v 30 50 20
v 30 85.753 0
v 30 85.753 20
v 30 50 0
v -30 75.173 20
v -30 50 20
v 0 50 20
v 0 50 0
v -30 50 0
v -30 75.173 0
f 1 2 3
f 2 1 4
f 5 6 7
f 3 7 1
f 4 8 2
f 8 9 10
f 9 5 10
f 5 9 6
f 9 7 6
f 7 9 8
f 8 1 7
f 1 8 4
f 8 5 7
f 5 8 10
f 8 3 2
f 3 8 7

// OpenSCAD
translate([-30,50,0])
scale([3,3,1])
rotate([0,0,0]) {
    difference() {
        cube([20, 20, 20]);
        translate([10, 0, -1]) {
            rotate([0,0,50]) {
                cube([30, 30, 30]);
            }
        }
    }
}
